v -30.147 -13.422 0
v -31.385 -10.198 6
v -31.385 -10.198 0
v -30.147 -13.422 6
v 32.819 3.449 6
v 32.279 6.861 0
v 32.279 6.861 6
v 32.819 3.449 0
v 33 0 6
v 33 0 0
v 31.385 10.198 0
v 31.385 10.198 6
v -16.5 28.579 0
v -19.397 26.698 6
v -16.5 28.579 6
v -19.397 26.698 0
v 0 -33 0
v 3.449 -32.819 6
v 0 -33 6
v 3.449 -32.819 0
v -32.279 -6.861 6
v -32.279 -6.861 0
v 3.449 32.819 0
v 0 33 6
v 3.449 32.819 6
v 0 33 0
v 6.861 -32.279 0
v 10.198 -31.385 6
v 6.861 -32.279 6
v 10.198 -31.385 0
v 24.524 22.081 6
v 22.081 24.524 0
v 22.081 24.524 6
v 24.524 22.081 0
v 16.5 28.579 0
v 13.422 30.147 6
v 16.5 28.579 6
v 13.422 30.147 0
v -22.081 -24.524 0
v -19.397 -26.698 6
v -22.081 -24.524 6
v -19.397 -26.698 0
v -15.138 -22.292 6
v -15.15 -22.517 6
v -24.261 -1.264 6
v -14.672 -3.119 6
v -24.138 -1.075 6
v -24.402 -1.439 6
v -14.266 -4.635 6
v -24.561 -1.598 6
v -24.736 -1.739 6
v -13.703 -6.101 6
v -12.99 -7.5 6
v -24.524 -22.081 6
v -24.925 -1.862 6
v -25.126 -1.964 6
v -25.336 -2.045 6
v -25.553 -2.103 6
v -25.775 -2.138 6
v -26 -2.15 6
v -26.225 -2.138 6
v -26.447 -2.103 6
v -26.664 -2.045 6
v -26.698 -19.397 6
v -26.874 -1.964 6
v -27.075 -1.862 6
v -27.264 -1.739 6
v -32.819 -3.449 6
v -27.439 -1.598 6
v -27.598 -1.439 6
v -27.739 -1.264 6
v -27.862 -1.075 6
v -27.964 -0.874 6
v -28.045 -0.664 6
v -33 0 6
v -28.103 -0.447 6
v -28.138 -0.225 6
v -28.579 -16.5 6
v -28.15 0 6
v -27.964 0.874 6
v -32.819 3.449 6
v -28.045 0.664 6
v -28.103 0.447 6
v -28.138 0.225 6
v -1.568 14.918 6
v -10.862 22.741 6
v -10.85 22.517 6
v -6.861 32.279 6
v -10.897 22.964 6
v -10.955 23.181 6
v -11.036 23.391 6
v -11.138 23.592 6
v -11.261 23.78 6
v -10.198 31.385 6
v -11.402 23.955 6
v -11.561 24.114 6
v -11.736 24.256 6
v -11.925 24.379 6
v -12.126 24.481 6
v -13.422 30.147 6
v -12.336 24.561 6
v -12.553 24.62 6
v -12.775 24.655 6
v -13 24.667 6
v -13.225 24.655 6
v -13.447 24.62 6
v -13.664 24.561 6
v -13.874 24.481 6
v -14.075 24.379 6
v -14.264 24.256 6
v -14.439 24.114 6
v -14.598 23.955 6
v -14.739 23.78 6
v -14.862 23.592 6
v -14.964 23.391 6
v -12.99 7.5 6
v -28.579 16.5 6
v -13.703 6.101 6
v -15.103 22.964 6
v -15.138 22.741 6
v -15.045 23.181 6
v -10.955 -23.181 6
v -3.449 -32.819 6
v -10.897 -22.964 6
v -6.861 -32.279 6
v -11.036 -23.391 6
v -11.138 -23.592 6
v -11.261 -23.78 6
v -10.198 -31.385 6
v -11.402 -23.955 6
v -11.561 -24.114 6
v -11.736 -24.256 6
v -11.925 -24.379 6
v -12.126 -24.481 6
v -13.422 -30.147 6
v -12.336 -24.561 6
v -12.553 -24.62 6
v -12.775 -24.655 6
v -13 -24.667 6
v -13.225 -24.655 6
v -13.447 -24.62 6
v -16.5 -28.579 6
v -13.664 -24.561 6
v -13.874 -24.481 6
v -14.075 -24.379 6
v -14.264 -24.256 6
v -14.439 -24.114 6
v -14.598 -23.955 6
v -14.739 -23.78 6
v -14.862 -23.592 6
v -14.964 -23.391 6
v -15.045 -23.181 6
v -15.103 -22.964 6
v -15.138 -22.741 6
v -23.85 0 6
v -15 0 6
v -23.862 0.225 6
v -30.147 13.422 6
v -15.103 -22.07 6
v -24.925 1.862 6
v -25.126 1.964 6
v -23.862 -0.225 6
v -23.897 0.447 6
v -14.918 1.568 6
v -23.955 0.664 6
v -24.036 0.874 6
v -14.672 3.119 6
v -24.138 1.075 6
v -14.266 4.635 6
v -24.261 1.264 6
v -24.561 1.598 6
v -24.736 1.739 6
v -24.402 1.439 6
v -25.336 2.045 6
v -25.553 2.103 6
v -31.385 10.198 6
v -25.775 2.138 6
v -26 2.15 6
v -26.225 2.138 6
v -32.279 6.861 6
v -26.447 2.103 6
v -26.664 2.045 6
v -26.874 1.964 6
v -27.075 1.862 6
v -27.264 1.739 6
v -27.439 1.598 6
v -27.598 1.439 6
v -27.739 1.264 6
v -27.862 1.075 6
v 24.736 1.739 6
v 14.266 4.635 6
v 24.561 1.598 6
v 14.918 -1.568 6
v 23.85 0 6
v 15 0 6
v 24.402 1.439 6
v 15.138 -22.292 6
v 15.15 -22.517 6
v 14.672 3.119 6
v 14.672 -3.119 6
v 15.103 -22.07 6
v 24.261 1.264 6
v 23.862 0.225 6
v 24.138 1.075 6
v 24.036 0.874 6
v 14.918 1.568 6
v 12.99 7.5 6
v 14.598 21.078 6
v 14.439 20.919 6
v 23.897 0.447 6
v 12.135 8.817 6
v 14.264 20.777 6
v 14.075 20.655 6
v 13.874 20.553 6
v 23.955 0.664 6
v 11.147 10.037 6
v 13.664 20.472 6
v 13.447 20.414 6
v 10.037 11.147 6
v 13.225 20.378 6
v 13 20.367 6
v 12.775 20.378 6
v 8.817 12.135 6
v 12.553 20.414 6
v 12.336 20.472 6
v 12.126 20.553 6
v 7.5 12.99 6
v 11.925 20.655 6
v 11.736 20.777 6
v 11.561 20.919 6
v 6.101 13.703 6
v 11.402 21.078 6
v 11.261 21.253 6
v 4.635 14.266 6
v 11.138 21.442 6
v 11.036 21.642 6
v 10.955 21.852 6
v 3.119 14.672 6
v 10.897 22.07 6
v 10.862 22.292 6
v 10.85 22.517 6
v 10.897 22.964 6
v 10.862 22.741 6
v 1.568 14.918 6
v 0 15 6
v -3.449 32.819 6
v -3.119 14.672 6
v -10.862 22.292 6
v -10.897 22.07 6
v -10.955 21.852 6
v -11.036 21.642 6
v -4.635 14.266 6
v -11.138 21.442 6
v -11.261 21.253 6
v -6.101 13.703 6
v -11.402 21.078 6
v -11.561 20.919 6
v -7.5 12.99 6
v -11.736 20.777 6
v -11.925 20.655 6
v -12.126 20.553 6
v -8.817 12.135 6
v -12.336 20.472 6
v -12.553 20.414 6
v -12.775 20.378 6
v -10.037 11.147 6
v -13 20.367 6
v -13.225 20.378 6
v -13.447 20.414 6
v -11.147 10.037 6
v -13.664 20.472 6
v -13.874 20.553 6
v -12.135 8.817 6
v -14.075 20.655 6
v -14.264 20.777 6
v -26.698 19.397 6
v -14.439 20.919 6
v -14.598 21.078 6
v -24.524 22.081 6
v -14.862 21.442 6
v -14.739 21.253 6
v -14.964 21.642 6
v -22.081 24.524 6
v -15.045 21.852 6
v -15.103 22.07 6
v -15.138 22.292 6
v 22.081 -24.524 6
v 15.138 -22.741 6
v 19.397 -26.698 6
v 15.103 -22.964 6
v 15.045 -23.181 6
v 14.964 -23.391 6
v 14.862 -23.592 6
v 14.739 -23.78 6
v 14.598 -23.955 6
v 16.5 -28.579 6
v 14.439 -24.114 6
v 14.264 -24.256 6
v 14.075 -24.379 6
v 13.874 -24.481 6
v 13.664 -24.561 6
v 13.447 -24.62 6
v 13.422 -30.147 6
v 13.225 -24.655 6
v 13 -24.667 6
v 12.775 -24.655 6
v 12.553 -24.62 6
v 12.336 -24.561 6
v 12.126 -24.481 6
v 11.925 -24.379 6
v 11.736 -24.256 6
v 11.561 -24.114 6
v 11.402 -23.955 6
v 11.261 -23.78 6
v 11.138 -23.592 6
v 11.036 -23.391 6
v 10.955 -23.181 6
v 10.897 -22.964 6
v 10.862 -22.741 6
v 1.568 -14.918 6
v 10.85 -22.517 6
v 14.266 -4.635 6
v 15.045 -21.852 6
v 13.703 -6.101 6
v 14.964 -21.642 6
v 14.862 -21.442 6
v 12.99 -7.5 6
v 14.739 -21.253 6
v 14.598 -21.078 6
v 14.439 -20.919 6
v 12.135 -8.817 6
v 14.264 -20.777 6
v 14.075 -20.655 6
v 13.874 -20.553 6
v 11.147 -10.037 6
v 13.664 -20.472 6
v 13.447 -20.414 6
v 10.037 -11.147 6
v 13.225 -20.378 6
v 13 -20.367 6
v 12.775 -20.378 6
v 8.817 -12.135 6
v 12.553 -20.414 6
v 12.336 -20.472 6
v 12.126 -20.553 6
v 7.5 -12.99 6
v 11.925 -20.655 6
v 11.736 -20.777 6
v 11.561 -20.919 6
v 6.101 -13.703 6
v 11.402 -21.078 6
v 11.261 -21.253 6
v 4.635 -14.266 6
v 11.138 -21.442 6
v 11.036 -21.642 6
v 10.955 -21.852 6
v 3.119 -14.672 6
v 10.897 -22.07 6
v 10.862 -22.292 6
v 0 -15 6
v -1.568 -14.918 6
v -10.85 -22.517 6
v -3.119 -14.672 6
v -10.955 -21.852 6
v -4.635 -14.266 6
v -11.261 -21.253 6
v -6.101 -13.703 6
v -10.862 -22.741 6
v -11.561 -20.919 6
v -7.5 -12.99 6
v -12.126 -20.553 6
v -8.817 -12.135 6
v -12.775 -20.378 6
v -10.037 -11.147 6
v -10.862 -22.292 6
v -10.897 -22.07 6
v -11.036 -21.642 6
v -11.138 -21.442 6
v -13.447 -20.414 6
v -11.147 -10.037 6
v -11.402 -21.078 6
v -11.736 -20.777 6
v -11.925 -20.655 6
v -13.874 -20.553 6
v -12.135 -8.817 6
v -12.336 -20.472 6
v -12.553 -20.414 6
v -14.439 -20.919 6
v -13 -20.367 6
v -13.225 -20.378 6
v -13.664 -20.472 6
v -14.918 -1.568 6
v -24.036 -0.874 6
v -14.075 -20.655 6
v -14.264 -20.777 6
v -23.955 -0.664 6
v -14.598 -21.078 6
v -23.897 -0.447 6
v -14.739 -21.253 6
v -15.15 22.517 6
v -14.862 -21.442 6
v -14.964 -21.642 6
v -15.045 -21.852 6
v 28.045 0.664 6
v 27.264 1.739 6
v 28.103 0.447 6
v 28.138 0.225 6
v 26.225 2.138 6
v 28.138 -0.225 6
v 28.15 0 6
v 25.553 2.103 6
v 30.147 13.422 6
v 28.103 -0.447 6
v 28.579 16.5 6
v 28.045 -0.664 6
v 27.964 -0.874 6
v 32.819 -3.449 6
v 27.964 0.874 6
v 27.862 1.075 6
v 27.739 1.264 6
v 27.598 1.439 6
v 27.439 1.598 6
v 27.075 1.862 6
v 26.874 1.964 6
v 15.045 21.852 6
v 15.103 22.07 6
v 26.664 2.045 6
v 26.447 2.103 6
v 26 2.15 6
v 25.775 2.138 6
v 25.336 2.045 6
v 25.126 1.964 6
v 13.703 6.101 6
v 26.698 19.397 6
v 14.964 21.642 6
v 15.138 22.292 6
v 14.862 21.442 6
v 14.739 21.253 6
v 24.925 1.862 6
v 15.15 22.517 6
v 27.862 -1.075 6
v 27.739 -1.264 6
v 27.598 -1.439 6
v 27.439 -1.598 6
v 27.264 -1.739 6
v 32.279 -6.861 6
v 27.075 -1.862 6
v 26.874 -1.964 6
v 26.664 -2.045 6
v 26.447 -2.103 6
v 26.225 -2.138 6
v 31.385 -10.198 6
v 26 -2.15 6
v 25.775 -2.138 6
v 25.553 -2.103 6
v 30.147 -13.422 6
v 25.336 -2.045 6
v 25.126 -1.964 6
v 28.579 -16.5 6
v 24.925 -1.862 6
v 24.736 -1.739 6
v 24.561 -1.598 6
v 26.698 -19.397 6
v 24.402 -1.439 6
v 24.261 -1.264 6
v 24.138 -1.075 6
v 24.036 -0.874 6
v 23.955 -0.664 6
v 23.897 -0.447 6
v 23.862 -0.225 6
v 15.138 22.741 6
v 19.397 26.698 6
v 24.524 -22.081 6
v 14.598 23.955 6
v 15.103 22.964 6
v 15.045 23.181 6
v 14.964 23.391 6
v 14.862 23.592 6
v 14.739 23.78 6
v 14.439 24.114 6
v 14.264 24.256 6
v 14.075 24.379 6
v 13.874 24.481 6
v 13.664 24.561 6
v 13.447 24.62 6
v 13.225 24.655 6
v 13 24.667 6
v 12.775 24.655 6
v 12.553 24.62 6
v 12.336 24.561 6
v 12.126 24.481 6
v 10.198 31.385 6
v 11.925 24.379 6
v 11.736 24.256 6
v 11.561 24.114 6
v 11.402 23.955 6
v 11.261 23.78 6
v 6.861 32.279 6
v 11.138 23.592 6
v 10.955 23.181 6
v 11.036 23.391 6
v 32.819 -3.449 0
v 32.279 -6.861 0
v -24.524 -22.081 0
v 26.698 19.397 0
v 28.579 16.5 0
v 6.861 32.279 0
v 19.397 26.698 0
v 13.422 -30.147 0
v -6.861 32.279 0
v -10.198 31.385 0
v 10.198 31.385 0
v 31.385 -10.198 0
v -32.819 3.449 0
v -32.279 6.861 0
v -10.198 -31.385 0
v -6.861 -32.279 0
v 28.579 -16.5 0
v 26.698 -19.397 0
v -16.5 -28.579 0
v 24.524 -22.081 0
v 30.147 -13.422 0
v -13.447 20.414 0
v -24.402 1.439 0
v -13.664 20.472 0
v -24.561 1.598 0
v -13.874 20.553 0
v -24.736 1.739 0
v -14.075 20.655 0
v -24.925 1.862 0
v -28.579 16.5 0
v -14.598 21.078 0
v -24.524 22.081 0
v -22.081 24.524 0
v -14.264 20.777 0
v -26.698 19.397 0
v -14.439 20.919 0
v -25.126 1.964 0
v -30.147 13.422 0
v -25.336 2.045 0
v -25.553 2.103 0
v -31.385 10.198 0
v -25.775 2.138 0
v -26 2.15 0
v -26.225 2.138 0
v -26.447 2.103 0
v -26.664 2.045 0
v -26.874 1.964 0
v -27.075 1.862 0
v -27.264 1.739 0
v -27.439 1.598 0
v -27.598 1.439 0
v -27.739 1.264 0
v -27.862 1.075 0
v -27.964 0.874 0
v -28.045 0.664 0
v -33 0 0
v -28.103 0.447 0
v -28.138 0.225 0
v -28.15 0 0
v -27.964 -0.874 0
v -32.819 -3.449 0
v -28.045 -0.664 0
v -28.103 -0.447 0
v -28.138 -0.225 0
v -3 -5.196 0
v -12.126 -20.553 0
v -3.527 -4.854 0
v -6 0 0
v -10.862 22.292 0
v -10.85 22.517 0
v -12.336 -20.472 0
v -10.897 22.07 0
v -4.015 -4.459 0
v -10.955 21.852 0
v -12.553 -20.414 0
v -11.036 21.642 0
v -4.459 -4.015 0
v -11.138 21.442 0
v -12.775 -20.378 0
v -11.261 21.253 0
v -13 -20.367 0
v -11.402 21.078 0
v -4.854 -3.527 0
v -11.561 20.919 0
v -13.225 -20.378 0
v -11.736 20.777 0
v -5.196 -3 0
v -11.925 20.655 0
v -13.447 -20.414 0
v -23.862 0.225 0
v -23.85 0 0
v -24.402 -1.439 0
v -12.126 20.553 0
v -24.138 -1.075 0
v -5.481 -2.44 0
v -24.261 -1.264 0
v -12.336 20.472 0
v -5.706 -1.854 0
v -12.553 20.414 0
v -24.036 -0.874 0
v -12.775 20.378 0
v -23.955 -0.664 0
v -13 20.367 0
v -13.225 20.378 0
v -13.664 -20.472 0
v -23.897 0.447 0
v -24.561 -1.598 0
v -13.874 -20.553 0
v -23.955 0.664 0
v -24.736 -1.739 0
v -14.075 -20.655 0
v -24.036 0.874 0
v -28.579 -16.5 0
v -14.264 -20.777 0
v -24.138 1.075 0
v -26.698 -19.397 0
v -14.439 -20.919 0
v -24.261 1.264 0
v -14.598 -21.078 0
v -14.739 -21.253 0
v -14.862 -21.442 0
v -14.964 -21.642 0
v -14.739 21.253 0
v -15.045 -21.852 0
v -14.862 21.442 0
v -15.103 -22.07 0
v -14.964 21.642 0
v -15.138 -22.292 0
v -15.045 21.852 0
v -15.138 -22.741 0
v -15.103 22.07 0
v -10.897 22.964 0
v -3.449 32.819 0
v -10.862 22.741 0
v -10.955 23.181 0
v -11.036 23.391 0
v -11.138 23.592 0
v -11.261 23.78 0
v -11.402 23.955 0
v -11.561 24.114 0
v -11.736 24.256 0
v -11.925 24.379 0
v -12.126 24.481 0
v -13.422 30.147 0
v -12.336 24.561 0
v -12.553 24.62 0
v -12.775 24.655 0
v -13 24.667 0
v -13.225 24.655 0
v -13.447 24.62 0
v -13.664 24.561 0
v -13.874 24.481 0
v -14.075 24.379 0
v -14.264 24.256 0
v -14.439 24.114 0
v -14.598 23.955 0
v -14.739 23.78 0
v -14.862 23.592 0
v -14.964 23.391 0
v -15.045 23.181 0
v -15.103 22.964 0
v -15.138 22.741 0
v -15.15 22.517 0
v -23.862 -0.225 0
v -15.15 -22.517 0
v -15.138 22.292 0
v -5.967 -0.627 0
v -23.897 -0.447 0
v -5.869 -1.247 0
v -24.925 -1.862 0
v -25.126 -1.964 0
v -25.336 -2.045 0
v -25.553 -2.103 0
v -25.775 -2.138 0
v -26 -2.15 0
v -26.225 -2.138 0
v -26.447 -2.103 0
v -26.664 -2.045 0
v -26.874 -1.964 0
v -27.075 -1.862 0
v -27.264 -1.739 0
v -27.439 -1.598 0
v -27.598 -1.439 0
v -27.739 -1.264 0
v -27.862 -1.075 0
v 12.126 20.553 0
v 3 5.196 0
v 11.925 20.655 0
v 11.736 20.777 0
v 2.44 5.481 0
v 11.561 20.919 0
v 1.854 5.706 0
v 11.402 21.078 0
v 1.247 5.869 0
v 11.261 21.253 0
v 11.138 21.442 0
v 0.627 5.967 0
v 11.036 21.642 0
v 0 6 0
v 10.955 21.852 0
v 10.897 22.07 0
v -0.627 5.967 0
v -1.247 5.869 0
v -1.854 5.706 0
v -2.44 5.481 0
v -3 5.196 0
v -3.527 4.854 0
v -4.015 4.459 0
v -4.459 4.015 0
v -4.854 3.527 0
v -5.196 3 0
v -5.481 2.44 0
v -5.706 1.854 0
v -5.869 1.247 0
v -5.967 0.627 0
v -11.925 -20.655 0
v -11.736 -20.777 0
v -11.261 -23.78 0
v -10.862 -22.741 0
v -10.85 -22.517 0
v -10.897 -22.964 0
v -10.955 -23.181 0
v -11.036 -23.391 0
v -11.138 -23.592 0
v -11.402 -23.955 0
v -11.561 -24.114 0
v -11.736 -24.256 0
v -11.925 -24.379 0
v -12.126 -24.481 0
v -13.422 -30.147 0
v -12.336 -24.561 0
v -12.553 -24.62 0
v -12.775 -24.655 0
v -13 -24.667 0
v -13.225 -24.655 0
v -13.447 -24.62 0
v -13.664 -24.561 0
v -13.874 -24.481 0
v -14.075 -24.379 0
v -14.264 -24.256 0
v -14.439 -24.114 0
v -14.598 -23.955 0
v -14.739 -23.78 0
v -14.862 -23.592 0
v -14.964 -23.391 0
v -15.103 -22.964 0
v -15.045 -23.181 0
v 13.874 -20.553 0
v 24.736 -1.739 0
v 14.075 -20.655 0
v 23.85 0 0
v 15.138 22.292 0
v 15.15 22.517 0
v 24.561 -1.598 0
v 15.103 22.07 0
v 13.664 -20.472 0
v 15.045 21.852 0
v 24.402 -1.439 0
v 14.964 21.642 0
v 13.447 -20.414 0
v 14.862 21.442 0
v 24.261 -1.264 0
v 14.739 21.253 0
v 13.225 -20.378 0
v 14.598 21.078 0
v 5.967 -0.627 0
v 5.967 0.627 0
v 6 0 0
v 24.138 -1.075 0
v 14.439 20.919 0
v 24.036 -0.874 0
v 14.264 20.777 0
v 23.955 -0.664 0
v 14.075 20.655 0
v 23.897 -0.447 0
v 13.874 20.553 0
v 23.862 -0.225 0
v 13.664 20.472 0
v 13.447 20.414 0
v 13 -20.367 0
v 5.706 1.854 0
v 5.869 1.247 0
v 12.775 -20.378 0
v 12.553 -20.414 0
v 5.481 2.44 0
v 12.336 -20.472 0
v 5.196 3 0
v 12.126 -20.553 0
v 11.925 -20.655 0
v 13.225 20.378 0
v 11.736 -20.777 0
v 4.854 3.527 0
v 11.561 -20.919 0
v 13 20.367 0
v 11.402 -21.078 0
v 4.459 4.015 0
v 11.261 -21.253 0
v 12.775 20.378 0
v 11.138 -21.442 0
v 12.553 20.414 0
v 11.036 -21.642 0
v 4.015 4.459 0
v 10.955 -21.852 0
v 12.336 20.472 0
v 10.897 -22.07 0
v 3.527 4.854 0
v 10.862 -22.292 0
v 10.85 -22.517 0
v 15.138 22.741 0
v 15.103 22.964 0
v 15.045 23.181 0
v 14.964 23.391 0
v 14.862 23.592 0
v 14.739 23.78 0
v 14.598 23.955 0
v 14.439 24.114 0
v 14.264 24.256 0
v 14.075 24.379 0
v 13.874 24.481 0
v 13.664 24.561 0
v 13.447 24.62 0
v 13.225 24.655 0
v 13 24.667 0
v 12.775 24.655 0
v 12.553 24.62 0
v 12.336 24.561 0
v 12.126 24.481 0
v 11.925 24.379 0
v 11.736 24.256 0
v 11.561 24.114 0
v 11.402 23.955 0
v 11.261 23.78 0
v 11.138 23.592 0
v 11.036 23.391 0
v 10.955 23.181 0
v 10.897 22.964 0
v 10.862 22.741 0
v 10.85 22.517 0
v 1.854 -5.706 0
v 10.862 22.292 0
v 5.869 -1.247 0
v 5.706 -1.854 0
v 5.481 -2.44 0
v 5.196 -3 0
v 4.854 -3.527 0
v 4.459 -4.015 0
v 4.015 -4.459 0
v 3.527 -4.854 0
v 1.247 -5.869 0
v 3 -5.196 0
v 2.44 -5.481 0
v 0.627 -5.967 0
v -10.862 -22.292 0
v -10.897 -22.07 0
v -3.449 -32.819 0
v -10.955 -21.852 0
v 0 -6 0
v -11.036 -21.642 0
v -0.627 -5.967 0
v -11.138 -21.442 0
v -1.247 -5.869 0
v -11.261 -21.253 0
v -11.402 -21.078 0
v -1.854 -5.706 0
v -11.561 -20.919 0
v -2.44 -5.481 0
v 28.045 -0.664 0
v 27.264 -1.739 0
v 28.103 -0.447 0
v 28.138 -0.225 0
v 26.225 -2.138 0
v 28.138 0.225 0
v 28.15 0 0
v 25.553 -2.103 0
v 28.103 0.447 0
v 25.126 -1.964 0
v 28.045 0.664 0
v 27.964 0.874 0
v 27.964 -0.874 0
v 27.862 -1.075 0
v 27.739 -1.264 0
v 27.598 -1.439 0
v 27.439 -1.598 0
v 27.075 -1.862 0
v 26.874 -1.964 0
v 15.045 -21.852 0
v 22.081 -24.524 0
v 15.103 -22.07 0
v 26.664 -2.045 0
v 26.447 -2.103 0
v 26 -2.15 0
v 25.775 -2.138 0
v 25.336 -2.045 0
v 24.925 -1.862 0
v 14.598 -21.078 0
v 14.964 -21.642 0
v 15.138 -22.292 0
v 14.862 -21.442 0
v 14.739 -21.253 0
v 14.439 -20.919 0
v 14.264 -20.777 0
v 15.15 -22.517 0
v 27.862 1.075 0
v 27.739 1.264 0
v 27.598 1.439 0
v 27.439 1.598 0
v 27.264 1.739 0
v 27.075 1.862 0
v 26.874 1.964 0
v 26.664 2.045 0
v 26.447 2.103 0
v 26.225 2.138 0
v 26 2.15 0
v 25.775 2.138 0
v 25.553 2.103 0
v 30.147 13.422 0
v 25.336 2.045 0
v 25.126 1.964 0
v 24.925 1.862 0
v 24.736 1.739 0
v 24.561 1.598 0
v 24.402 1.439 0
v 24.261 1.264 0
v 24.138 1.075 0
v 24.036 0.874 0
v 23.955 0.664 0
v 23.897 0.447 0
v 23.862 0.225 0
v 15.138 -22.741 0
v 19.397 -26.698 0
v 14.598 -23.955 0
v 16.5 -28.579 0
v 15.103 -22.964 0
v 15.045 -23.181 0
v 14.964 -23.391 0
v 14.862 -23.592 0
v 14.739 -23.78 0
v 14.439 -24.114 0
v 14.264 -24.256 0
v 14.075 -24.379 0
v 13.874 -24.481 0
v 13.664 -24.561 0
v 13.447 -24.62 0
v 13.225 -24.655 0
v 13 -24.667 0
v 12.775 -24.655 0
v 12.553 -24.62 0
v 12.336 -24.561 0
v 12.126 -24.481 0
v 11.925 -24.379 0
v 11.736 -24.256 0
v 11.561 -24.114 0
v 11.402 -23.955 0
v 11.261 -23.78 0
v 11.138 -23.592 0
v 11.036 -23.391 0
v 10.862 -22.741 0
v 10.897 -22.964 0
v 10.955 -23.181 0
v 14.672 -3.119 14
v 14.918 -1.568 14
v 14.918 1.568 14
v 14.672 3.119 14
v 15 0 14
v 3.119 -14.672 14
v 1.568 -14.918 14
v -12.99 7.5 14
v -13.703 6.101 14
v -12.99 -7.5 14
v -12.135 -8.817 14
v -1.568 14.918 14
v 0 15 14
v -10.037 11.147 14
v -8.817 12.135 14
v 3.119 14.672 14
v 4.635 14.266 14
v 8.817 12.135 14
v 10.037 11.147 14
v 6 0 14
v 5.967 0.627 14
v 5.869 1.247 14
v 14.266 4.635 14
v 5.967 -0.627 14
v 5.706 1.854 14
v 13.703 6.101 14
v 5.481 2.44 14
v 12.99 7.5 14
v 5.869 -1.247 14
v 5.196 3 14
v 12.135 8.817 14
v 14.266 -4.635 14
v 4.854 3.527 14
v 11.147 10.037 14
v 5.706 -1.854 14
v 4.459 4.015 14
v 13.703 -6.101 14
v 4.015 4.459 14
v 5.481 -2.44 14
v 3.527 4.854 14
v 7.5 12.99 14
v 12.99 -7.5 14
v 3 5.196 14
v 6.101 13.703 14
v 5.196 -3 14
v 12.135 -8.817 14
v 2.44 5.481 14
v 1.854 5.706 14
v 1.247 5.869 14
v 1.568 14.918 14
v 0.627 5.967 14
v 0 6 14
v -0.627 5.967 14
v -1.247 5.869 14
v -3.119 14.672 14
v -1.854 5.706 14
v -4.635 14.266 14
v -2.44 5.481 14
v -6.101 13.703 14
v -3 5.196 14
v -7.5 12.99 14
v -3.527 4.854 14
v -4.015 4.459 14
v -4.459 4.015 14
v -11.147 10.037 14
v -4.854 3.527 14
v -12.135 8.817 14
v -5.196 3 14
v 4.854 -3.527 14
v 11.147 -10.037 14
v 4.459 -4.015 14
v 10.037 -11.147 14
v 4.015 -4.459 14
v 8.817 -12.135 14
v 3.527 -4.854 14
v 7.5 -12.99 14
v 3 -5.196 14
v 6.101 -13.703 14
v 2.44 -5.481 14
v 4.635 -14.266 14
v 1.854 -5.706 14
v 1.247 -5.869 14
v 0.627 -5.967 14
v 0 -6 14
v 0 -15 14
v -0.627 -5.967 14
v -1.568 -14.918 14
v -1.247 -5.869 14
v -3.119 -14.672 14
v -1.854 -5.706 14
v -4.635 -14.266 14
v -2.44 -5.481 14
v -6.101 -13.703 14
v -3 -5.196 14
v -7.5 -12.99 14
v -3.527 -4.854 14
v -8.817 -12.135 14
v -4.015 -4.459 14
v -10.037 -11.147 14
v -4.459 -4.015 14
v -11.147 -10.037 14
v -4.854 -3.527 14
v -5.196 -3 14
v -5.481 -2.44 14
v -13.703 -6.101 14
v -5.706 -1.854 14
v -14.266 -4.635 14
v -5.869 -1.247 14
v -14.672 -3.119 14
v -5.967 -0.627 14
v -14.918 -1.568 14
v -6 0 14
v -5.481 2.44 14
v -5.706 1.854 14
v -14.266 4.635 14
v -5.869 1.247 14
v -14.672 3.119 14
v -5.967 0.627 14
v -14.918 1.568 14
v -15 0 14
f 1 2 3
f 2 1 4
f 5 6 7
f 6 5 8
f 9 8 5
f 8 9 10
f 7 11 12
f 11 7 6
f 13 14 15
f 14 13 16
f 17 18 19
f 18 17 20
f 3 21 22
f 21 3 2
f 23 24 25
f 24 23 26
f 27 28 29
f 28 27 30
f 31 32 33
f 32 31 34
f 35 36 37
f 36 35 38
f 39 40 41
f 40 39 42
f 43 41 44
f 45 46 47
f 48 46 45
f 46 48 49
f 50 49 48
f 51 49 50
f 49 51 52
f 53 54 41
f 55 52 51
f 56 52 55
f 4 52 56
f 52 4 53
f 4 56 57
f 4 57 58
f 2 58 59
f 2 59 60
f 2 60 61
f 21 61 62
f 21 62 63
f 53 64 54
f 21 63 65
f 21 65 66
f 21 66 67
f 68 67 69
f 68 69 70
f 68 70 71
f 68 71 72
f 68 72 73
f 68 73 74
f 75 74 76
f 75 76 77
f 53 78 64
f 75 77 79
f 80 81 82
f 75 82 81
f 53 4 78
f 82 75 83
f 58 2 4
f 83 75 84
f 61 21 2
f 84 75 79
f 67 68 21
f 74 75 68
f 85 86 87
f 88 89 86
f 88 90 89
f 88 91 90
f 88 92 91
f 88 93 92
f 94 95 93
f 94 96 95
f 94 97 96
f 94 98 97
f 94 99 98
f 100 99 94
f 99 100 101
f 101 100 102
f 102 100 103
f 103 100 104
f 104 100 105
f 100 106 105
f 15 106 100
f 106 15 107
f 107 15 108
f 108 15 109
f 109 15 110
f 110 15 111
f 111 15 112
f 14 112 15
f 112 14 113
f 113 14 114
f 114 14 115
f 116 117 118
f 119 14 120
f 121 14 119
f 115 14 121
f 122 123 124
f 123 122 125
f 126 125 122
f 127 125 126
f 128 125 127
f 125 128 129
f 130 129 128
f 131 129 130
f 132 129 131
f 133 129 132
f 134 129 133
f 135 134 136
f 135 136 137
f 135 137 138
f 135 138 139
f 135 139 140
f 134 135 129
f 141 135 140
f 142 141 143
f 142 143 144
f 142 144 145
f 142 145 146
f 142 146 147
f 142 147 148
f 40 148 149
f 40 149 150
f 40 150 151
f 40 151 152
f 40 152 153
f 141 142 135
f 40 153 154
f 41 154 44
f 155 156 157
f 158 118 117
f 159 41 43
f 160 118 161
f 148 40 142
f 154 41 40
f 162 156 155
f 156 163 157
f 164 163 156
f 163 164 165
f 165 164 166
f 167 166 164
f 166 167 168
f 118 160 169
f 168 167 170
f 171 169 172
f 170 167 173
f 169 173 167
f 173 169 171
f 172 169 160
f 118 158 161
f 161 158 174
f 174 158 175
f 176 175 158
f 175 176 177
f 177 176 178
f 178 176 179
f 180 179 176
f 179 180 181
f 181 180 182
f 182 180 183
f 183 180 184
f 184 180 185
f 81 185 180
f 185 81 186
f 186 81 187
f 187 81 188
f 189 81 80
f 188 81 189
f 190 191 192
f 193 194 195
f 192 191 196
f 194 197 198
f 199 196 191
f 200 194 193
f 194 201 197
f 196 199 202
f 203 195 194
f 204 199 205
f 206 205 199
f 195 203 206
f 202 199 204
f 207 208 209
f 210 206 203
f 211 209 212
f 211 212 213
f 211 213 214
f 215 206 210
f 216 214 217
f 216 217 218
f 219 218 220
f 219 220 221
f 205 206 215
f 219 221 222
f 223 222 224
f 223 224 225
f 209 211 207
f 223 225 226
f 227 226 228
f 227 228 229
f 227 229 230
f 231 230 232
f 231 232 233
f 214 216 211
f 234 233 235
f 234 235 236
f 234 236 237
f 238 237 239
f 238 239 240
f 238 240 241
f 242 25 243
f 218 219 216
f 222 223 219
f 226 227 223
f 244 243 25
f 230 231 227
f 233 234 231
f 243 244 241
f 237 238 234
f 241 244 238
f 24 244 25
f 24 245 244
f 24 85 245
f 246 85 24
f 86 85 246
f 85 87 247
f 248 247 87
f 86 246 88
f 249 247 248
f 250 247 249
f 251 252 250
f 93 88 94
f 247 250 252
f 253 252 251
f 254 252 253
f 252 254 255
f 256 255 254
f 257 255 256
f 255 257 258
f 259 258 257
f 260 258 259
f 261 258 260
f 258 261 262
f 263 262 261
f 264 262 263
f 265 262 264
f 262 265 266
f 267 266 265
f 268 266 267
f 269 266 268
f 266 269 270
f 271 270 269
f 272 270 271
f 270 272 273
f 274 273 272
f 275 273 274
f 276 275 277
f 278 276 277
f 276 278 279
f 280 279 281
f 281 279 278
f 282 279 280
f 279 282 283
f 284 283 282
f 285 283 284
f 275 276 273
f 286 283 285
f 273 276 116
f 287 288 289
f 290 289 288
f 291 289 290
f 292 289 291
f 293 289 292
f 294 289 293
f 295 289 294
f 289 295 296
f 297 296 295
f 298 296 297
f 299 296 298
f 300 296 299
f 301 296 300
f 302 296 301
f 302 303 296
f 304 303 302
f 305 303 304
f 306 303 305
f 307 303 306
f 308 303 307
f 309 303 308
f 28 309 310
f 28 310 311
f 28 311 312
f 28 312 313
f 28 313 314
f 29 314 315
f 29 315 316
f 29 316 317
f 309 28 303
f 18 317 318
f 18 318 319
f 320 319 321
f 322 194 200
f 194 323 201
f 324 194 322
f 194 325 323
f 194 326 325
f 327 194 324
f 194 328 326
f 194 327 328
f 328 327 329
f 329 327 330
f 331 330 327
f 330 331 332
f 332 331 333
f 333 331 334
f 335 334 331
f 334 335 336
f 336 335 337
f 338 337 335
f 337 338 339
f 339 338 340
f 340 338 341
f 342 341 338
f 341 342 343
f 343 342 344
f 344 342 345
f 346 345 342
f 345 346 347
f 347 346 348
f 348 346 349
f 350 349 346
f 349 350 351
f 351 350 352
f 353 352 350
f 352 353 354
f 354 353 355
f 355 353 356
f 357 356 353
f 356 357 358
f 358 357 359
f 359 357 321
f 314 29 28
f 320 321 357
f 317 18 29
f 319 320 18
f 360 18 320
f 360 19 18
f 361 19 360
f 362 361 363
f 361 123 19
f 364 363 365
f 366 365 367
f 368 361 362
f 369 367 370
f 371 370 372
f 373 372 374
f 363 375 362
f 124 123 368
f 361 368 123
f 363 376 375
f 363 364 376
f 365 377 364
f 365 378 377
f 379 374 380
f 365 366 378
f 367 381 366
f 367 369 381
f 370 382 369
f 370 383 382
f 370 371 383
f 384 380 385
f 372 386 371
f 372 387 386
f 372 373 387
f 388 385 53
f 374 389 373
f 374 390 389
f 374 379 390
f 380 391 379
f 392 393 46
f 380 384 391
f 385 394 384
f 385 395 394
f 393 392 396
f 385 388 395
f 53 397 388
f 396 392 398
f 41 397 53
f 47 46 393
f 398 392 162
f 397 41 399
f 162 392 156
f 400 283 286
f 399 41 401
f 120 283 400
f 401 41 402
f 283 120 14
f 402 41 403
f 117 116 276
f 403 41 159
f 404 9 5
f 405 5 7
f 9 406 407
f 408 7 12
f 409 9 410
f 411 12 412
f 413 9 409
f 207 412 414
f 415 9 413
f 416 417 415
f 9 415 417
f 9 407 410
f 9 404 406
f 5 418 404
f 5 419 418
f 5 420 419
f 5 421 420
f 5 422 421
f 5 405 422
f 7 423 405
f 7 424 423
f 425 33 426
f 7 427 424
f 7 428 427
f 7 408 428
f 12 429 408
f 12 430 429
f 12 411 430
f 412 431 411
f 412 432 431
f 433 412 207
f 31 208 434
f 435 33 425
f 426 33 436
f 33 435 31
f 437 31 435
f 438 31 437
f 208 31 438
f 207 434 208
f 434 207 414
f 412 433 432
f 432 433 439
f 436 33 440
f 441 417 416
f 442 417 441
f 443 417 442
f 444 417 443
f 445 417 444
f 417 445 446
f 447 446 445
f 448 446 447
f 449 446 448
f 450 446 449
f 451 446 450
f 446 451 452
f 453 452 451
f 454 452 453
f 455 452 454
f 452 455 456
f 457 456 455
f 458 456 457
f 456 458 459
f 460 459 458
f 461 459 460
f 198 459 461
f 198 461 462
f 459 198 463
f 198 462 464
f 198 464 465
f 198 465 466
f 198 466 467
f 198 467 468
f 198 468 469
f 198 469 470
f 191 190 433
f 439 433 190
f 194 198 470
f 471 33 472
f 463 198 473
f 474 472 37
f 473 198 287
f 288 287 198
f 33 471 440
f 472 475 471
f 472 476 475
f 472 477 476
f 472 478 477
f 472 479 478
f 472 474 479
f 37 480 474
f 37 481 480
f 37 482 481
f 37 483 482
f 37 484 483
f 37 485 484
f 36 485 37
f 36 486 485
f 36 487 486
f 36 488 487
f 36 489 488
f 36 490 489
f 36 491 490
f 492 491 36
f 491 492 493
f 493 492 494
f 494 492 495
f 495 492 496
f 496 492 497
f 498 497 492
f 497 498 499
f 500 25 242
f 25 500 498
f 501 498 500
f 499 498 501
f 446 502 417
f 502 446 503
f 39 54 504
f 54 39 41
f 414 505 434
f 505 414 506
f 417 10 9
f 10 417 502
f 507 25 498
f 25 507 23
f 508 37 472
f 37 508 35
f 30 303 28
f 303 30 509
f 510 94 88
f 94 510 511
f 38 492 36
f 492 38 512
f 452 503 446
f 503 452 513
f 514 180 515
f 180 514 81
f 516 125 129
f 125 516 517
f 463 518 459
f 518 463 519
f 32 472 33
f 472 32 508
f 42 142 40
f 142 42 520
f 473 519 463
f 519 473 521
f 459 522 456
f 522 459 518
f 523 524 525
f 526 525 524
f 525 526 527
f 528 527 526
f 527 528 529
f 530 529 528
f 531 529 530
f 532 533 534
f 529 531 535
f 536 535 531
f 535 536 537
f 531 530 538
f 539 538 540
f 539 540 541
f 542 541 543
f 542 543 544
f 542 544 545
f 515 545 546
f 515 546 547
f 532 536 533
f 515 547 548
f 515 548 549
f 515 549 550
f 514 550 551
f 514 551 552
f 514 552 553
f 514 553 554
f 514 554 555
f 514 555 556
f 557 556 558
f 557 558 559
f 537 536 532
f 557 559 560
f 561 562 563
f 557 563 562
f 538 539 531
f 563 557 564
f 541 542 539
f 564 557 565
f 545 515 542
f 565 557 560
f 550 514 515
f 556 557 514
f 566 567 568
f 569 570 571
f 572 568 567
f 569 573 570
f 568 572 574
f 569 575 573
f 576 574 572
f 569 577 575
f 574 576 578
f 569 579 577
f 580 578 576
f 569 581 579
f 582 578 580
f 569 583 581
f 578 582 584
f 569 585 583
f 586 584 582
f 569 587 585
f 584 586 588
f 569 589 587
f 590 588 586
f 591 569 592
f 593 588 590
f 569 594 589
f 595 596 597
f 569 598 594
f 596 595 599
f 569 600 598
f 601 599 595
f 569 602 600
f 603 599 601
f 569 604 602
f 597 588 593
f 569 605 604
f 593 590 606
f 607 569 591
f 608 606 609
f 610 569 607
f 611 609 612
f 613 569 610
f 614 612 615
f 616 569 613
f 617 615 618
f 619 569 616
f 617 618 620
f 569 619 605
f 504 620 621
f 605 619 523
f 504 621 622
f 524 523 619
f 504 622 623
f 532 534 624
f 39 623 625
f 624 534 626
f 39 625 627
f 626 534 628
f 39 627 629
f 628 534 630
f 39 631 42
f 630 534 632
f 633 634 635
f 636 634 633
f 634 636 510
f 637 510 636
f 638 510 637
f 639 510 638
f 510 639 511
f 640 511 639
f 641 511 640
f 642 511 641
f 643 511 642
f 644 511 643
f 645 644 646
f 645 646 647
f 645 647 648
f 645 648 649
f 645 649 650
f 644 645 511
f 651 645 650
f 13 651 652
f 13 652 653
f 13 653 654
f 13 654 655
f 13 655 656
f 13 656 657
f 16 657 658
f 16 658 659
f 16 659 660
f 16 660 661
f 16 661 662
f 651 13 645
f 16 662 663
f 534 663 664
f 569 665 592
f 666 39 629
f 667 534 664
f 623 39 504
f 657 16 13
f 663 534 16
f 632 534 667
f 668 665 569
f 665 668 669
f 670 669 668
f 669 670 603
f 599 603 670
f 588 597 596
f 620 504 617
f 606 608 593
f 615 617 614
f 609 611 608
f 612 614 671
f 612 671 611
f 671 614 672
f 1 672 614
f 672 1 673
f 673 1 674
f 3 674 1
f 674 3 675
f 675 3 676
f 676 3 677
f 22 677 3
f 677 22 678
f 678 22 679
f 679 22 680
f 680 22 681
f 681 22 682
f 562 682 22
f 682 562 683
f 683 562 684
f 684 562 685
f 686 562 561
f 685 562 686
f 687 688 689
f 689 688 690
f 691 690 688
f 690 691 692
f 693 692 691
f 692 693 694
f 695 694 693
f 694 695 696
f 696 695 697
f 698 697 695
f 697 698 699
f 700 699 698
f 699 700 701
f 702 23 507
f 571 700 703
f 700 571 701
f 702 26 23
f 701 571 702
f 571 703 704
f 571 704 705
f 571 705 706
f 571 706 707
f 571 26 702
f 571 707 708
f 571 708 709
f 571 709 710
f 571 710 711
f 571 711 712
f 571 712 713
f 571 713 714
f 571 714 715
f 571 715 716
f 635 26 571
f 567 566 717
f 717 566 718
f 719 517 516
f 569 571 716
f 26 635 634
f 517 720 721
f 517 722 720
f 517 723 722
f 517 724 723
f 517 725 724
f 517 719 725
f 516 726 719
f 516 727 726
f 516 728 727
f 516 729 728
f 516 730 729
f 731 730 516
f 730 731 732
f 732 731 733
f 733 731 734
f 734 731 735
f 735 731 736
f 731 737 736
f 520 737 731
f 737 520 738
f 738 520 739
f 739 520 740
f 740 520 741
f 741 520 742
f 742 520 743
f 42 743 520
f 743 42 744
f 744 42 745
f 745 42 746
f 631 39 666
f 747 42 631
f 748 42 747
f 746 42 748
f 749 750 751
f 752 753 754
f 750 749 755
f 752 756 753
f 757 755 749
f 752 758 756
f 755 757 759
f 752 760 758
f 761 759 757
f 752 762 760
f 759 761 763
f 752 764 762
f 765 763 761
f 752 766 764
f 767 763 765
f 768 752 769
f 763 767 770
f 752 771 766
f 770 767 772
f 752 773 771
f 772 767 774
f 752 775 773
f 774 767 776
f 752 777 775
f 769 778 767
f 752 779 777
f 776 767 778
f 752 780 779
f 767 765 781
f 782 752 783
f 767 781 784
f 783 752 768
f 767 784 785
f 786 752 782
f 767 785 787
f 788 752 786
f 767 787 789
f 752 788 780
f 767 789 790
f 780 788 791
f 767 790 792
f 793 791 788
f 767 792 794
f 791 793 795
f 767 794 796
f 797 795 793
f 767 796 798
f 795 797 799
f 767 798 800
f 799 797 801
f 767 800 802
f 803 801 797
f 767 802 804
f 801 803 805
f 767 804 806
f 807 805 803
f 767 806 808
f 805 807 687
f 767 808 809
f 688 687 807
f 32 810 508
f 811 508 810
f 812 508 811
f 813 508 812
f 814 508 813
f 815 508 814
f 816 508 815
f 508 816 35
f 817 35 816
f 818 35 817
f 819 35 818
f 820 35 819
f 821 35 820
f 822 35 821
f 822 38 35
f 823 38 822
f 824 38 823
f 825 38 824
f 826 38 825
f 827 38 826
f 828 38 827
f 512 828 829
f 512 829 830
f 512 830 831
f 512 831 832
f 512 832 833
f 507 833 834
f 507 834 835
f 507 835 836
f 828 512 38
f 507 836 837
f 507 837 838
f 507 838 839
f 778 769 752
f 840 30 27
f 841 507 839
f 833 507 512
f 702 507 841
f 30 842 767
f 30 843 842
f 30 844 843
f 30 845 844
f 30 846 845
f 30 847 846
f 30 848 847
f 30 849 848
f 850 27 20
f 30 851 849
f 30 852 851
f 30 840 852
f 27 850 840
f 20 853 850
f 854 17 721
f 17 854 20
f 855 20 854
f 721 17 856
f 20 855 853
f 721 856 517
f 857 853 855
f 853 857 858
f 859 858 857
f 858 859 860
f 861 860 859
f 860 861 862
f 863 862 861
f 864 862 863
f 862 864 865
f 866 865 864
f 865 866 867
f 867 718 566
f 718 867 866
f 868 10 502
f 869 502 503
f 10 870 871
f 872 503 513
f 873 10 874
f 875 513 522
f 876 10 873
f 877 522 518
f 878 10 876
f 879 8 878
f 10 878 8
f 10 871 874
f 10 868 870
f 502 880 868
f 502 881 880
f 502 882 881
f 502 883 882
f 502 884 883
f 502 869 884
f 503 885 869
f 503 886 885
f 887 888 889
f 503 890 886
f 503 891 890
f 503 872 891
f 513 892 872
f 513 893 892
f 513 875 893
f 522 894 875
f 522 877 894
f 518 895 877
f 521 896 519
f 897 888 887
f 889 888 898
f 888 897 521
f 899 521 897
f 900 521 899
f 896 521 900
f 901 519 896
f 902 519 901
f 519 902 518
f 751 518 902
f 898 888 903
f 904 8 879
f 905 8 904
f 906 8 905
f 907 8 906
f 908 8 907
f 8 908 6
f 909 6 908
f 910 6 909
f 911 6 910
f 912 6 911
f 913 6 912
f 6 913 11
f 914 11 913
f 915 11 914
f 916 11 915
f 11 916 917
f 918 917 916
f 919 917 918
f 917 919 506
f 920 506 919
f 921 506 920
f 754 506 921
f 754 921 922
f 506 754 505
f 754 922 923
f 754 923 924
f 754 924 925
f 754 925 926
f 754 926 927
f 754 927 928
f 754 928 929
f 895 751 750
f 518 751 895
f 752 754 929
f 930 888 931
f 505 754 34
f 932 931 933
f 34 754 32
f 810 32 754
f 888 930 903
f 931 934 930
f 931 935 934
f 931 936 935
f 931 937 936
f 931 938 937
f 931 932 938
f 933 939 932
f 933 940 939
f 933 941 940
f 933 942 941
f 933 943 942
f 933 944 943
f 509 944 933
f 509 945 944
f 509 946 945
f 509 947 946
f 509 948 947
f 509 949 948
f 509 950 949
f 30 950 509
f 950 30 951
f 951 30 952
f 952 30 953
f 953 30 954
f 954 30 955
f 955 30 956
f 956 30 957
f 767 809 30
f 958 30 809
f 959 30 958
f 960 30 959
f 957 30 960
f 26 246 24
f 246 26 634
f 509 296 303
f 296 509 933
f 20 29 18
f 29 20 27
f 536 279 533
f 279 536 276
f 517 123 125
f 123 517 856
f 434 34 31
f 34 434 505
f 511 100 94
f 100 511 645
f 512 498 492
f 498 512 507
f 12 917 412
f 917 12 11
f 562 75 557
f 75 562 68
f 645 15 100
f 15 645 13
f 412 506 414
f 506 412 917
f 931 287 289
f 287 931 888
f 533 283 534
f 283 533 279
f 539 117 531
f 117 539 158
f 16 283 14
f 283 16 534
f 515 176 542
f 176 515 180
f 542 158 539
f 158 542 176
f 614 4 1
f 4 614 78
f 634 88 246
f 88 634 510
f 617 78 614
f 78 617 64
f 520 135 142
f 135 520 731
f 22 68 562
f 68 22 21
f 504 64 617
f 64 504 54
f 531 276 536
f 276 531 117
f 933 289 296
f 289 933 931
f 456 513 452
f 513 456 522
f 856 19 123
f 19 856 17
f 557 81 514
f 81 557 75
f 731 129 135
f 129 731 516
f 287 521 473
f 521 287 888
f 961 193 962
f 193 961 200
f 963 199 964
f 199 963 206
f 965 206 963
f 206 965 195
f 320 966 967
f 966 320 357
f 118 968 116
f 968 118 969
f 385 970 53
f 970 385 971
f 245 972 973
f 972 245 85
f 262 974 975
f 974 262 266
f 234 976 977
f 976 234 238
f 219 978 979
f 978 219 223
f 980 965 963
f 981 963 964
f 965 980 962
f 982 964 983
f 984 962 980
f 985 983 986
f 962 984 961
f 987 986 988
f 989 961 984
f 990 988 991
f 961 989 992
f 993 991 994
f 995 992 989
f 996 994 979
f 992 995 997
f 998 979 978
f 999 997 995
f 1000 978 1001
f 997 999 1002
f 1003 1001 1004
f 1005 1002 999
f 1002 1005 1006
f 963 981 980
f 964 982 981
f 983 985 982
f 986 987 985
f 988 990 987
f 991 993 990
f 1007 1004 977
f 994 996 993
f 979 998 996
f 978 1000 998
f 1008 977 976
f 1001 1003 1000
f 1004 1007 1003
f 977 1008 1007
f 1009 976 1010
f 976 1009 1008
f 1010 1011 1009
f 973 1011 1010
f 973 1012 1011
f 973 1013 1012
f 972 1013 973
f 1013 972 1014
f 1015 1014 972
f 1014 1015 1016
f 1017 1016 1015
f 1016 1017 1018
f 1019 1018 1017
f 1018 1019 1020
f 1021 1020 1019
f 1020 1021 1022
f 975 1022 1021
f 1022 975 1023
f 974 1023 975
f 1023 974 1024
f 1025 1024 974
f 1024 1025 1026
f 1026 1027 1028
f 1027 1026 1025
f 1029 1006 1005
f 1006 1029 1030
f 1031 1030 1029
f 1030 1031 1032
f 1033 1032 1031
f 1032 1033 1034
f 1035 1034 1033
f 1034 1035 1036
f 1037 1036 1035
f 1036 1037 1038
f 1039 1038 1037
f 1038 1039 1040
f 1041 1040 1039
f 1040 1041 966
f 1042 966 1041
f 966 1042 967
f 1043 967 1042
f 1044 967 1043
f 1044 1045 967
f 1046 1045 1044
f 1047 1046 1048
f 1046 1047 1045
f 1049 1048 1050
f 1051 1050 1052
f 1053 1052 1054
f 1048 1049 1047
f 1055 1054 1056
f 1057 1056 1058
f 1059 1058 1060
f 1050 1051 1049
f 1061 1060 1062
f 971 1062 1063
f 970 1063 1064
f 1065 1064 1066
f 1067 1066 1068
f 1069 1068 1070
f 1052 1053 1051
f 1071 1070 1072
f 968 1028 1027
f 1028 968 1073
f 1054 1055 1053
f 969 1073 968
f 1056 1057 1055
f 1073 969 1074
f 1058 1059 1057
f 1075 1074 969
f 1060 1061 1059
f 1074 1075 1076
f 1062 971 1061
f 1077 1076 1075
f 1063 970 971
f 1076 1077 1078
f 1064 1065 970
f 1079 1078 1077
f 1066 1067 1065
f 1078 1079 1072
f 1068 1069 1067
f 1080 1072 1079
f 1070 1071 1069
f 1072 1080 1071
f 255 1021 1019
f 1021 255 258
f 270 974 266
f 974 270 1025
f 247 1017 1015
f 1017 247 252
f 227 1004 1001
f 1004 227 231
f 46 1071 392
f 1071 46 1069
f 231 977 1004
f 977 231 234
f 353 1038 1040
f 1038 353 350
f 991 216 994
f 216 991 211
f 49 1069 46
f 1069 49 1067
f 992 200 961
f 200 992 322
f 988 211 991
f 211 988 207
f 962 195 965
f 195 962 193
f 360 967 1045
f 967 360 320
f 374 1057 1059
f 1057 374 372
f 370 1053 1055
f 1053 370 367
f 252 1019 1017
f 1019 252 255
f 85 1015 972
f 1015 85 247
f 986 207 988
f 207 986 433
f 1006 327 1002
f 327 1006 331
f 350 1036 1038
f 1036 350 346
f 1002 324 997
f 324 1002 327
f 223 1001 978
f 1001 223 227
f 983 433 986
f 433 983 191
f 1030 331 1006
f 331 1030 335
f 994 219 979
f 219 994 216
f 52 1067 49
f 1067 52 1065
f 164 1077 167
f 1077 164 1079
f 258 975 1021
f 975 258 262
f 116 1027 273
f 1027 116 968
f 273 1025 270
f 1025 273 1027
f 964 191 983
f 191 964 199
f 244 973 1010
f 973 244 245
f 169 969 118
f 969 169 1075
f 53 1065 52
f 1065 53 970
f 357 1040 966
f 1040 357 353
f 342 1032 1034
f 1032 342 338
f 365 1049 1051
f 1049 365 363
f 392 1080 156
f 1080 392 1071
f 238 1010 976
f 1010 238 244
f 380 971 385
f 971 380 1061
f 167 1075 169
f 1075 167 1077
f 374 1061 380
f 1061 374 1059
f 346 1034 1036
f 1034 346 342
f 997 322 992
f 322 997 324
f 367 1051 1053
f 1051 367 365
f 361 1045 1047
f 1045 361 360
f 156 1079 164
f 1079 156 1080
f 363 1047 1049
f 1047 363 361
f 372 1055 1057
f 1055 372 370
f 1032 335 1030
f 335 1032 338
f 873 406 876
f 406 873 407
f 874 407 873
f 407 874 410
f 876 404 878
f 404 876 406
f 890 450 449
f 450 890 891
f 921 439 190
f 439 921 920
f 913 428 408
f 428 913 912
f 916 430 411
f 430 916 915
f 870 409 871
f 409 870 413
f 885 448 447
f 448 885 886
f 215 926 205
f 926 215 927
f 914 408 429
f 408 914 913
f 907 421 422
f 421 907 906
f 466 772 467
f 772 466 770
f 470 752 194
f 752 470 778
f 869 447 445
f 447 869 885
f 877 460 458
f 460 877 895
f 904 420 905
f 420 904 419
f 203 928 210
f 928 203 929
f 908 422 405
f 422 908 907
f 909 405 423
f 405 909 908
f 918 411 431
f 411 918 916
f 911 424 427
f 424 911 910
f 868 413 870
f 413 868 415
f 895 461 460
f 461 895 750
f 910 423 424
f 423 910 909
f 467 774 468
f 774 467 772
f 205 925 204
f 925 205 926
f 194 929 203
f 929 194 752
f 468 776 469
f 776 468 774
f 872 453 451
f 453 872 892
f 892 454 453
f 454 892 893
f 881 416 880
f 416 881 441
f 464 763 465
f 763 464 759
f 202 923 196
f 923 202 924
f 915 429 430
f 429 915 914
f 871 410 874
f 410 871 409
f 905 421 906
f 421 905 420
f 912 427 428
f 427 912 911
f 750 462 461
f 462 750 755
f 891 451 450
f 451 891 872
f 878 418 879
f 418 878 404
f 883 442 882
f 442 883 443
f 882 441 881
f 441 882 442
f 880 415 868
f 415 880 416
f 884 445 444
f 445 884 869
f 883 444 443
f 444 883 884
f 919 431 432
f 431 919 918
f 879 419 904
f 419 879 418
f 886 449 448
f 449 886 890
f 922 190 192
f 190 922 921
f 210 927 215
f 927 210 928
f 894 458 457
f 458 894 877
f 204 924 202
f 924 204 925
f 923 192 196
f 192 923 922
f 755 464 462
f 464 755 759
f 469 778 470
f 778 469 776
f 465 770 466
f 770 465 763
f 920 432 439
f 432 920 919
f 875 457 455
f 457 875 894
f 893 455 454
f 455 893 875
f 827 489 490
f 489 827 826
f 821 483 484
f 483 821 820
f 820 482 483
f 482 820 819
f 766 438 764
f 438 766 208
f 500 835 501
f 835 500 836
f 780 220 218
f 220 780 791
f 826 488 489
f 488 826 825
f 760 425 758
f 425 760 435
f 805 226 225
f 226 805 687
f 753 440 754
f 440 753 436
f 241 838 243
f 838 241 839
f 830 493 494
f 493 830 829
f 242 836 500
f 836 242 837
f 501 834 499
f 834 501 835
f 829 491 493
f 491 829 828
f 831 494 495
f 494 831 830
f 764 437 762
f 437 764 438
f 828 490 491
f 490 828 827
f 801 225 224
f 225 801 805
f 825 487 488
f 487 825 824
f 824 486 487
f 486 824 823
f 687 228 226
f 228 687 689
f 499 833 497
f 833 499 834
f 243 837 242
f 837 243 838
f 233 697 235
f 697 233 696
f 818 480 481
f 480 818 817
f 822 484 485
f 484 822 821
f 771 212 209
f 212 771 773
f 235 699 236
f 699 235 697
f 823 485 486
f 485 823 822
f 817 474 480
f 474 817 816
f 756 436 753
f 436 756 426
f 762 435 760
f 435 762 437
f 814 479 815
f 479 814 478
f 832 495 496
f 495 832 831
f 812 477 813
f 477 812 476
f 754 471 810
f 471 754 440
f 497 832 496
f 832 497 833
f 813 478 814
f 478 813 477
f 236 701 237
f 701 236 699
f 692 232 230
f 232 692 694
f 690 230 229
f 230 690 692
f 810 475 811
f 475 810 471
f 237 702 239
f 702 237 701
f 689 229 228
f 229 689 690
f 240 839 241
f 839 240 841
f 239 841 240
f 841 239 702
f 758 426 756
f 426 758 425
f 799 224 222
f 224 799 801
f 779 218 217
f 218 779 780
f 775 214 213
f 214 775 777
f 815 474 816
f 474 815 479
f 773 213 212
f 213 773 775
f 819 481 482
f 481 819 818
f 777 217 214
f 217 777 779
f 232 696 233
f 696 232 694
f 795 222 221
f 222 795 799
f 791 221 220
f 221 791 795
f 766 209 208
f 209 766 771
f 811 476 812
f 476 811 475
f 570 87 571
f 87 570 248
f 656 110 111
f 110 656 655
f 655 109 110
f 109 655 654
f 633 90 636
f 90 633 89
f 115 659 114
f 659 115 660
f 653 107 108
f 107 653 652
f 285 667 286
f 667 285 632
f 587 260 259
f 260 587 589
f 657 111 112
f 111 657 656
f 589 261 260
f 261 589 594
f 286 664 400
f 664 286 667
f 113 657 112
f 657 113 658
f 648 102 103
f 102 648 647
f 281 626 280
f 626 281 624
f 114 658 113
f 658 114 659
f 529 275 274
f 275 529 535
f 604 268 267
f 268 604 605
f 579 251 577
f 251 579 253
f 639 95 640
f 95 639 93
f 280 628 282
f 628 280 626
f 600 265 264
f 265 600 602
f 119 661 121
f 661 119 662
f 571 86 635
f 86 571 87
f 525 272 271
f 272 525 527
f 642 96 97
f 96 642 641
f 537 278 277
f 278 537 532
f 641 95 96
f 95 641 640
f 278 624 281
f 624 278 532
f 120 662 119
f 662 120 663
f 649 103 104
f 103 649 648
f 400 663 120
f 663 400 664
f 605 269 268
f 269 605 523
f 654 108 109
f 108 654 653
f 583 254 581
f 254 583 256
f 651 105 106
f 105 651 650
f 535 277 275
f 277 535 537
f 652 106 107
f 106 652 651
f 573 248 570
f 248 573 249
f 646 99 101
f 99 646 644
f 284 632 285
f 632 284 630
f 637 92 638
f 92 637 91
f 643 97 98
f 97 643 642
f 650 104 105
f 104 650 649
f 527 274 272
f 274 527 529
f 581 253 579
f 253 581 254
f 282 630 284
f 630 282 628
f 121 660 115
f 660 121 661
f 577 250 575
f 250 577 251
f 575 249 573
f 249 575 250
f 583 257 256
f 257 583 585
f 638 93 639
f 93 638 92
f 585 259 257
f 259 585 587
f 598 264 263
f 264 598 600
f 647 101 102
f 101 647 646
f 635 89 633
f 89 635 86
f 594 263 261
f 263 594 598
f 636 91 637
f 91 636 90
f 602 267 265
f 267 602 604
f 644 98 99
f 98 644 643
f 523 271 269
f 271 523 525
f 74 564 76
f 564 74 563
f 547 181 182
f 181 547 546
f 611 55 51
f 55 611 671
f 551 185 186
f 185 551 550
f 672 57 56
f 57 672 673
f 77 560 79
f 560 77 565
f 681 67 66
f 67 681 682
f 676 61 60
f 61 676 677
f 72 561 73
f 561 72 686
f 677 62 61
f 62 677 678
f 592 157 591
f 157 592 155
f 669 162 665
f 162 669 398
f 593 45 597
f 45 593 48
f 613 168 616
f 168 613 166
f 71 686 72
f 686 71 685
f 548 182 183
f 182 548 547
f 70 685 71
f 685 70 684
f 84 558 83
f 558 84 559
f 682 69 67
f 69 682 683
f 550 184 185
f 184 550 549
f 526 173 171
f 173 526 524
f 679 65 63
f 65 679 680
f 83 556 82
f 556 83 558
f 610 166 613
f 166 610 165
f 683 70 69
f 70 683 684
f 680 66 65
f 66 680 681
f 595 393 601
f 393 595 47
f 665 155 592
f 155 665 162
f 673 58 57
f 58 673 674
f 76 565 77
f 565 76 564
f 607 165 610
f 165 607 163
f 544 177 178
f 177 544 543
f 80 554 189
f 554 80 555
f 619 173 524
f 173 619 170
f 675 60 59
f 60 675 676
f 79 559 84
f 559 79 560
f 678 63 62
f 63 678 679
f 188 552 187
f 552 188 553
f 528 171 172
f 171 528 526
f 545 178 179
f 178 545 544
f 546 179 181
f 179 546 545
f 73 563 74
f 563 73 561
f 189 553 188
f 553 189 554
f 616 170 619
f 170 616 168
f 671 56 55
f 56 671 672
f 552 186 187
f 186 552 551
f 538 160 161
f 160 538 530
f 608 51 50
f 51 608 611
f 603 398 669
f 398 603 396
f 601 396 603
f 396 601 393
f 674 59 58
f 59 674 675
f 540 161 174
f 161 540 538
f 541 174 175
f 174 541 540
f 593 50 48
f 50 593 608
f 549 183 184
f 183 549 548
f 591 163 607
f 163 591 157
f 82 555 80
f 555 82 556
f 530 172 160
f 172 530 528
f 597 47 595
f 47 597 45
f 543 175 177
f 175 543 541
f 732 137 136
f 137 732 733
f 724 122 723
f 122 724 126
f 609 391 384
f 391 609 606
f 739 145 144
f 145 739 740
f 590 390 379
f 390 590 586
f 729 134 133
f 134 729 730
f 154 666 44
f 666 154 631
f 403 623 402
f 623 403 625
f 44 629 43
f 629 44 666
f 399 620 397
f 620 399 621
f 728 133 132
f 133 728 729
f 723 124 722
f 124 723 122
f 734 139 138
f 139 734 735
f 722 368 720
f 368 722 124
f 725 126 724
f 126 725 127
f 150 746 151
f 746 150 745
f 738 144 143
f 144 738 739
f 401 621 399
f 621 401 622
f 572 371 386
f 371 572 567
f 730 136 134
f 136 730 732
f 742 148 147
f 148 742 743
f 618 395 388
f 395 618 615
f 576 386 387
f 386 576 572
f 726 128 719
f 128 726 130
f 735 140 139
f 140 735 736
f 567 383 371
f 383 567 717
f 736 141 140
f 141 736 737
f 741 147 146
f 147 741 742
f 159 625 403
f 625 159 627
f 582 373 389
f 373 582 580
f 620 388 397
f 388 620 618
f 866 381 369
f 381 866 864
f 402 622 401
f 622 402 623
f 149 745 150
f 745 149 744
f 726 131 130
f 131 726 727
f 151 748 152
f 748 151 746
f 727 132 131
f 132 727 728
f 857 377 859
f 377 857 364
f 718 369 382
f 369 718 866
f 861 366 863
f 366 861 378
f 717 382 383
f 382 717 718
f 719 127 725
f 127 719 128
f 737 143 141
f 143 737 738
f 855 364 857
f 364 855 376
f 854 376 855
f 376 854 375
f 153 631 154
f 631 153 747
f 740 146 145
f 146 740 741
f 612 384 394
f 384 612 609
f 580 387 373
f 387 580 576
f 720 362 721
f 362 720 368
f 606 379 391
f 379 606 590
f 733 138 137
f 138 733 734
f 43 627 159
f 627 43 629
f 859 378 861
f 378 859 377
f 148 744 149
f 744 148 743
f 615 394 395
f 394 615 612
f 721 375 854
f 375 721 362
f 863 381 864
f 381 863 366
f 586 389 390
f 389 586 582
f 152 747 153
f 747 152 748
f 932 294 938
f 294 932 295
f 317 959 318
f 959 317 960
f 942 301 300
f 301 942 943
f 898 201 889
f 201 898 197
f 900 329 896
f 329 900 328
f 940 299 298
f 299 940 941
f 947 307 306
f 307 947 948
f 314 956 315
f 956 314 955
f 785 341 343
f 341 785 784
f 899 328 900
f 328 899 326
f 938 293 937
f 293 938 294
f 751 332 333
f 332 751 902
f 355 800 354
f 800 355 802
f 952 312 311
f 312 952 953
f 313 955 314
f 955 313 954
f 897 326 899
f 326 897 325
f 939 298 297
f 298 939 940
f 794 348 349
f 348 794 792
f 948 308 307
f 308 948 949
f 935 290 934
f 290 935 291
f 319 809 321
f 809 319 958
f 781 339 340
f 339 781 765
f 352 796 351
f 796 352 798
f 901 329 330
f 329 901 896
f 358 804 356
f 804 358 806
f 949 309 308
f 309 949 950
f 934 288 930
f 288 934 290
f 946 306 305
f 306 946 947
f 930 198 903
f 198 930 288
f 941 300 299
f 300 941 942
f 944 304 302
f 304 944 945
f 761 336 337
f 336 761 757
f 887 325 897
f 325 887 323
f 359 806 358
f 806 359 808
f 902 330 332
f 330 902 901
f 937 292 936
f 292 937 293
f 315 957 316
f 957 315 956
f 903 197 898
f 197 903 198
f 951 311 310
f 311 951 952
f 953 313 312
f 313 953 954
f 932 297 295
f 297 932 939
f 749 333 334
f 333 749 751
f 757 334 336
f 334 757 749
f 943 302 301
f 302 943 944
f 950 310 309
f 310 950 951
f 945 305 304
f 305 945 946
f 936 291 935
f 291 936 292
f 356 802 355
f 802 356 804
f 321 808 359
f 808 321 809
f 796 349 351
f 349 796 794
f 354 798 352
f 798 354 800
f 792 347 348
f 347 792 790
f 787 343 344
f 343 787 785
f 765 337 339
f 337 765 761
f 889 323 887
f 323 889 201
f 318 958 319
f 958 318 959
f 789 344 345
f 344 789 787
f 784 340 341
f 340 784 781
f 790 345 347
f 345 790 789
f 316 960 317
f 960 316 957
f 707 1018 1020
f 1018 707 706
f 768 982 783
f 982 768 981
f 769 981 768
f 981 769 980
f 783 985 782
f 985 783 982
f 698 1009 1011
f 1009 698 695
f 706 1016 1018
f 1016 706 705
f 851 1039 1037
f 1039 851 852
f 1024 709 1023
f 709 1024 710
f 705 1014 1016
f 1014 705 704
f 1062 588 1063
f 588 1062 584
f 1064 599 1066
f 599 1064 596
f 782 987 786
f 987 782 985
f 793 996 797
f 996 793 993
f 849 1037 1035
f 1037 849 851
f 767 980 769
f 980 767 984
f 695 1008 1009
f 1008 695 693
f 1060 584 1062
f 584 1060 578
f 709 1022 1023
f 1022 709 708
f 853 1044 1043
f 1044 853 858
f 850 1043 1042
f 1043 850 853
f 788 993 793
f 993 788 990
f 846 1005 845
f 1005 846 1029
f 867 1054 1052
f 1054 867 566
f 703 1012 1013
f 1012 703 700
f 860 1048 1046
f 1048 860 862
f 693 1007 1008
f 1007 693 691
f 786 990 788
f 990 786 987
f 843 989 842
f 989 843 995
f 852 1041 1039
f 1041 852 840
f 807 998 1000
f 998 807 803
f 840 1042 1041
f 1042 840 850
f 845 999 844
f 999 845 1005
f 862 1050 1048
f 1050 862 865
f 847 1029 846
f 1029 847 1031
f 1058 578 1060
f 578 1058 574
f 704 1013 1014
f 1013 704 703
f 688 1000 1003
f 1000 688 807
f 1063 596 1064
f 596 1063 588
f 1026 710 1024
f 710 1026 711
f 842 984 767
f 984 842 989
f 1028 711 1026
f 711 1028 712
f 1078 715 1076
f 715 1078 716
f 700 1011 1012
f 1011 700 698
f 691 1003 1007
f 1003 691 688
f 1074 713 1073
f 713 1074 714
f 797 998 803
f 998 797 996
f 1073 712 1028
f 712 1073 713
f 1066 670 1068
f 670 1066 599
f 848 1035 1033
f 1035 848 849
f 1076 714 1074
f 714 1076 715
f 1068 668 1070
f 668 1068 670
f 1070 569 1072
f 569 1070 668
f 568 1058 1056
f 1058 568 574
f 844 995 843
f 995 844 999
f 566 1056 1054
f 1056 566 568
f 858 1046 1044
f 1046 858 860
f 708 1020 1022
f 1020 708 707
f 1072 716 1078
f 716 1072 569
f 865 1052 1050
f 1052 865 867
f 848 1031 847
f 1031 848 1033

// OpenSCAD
// 6-bolt mounting flange, 66 mm OD.
$fn = 60;
eps = 0.02;
flange_d = 66;
flange_t = 6;
hub_d = 30;
hub_h = 14;
center_d = 12;
bolt_circle_d = 52;
bolt_d = 4.3;
difference() {
    union() { cylinder(d = flange_d, h = flange_t); cylinder(d = hub_d, h = hub_h); }
    translate([0, 0, -eps]) cylinder(d = center_d, h = hub_h + 2 * eps);
    for (i = [0 : 5]) rotate([0, 0, i * 360 / 6])
        translate([bolt_circle_d / 2, 0, -eps]) cylinder(d = bolt_d, h = flange_t + 2 * eps);
}
